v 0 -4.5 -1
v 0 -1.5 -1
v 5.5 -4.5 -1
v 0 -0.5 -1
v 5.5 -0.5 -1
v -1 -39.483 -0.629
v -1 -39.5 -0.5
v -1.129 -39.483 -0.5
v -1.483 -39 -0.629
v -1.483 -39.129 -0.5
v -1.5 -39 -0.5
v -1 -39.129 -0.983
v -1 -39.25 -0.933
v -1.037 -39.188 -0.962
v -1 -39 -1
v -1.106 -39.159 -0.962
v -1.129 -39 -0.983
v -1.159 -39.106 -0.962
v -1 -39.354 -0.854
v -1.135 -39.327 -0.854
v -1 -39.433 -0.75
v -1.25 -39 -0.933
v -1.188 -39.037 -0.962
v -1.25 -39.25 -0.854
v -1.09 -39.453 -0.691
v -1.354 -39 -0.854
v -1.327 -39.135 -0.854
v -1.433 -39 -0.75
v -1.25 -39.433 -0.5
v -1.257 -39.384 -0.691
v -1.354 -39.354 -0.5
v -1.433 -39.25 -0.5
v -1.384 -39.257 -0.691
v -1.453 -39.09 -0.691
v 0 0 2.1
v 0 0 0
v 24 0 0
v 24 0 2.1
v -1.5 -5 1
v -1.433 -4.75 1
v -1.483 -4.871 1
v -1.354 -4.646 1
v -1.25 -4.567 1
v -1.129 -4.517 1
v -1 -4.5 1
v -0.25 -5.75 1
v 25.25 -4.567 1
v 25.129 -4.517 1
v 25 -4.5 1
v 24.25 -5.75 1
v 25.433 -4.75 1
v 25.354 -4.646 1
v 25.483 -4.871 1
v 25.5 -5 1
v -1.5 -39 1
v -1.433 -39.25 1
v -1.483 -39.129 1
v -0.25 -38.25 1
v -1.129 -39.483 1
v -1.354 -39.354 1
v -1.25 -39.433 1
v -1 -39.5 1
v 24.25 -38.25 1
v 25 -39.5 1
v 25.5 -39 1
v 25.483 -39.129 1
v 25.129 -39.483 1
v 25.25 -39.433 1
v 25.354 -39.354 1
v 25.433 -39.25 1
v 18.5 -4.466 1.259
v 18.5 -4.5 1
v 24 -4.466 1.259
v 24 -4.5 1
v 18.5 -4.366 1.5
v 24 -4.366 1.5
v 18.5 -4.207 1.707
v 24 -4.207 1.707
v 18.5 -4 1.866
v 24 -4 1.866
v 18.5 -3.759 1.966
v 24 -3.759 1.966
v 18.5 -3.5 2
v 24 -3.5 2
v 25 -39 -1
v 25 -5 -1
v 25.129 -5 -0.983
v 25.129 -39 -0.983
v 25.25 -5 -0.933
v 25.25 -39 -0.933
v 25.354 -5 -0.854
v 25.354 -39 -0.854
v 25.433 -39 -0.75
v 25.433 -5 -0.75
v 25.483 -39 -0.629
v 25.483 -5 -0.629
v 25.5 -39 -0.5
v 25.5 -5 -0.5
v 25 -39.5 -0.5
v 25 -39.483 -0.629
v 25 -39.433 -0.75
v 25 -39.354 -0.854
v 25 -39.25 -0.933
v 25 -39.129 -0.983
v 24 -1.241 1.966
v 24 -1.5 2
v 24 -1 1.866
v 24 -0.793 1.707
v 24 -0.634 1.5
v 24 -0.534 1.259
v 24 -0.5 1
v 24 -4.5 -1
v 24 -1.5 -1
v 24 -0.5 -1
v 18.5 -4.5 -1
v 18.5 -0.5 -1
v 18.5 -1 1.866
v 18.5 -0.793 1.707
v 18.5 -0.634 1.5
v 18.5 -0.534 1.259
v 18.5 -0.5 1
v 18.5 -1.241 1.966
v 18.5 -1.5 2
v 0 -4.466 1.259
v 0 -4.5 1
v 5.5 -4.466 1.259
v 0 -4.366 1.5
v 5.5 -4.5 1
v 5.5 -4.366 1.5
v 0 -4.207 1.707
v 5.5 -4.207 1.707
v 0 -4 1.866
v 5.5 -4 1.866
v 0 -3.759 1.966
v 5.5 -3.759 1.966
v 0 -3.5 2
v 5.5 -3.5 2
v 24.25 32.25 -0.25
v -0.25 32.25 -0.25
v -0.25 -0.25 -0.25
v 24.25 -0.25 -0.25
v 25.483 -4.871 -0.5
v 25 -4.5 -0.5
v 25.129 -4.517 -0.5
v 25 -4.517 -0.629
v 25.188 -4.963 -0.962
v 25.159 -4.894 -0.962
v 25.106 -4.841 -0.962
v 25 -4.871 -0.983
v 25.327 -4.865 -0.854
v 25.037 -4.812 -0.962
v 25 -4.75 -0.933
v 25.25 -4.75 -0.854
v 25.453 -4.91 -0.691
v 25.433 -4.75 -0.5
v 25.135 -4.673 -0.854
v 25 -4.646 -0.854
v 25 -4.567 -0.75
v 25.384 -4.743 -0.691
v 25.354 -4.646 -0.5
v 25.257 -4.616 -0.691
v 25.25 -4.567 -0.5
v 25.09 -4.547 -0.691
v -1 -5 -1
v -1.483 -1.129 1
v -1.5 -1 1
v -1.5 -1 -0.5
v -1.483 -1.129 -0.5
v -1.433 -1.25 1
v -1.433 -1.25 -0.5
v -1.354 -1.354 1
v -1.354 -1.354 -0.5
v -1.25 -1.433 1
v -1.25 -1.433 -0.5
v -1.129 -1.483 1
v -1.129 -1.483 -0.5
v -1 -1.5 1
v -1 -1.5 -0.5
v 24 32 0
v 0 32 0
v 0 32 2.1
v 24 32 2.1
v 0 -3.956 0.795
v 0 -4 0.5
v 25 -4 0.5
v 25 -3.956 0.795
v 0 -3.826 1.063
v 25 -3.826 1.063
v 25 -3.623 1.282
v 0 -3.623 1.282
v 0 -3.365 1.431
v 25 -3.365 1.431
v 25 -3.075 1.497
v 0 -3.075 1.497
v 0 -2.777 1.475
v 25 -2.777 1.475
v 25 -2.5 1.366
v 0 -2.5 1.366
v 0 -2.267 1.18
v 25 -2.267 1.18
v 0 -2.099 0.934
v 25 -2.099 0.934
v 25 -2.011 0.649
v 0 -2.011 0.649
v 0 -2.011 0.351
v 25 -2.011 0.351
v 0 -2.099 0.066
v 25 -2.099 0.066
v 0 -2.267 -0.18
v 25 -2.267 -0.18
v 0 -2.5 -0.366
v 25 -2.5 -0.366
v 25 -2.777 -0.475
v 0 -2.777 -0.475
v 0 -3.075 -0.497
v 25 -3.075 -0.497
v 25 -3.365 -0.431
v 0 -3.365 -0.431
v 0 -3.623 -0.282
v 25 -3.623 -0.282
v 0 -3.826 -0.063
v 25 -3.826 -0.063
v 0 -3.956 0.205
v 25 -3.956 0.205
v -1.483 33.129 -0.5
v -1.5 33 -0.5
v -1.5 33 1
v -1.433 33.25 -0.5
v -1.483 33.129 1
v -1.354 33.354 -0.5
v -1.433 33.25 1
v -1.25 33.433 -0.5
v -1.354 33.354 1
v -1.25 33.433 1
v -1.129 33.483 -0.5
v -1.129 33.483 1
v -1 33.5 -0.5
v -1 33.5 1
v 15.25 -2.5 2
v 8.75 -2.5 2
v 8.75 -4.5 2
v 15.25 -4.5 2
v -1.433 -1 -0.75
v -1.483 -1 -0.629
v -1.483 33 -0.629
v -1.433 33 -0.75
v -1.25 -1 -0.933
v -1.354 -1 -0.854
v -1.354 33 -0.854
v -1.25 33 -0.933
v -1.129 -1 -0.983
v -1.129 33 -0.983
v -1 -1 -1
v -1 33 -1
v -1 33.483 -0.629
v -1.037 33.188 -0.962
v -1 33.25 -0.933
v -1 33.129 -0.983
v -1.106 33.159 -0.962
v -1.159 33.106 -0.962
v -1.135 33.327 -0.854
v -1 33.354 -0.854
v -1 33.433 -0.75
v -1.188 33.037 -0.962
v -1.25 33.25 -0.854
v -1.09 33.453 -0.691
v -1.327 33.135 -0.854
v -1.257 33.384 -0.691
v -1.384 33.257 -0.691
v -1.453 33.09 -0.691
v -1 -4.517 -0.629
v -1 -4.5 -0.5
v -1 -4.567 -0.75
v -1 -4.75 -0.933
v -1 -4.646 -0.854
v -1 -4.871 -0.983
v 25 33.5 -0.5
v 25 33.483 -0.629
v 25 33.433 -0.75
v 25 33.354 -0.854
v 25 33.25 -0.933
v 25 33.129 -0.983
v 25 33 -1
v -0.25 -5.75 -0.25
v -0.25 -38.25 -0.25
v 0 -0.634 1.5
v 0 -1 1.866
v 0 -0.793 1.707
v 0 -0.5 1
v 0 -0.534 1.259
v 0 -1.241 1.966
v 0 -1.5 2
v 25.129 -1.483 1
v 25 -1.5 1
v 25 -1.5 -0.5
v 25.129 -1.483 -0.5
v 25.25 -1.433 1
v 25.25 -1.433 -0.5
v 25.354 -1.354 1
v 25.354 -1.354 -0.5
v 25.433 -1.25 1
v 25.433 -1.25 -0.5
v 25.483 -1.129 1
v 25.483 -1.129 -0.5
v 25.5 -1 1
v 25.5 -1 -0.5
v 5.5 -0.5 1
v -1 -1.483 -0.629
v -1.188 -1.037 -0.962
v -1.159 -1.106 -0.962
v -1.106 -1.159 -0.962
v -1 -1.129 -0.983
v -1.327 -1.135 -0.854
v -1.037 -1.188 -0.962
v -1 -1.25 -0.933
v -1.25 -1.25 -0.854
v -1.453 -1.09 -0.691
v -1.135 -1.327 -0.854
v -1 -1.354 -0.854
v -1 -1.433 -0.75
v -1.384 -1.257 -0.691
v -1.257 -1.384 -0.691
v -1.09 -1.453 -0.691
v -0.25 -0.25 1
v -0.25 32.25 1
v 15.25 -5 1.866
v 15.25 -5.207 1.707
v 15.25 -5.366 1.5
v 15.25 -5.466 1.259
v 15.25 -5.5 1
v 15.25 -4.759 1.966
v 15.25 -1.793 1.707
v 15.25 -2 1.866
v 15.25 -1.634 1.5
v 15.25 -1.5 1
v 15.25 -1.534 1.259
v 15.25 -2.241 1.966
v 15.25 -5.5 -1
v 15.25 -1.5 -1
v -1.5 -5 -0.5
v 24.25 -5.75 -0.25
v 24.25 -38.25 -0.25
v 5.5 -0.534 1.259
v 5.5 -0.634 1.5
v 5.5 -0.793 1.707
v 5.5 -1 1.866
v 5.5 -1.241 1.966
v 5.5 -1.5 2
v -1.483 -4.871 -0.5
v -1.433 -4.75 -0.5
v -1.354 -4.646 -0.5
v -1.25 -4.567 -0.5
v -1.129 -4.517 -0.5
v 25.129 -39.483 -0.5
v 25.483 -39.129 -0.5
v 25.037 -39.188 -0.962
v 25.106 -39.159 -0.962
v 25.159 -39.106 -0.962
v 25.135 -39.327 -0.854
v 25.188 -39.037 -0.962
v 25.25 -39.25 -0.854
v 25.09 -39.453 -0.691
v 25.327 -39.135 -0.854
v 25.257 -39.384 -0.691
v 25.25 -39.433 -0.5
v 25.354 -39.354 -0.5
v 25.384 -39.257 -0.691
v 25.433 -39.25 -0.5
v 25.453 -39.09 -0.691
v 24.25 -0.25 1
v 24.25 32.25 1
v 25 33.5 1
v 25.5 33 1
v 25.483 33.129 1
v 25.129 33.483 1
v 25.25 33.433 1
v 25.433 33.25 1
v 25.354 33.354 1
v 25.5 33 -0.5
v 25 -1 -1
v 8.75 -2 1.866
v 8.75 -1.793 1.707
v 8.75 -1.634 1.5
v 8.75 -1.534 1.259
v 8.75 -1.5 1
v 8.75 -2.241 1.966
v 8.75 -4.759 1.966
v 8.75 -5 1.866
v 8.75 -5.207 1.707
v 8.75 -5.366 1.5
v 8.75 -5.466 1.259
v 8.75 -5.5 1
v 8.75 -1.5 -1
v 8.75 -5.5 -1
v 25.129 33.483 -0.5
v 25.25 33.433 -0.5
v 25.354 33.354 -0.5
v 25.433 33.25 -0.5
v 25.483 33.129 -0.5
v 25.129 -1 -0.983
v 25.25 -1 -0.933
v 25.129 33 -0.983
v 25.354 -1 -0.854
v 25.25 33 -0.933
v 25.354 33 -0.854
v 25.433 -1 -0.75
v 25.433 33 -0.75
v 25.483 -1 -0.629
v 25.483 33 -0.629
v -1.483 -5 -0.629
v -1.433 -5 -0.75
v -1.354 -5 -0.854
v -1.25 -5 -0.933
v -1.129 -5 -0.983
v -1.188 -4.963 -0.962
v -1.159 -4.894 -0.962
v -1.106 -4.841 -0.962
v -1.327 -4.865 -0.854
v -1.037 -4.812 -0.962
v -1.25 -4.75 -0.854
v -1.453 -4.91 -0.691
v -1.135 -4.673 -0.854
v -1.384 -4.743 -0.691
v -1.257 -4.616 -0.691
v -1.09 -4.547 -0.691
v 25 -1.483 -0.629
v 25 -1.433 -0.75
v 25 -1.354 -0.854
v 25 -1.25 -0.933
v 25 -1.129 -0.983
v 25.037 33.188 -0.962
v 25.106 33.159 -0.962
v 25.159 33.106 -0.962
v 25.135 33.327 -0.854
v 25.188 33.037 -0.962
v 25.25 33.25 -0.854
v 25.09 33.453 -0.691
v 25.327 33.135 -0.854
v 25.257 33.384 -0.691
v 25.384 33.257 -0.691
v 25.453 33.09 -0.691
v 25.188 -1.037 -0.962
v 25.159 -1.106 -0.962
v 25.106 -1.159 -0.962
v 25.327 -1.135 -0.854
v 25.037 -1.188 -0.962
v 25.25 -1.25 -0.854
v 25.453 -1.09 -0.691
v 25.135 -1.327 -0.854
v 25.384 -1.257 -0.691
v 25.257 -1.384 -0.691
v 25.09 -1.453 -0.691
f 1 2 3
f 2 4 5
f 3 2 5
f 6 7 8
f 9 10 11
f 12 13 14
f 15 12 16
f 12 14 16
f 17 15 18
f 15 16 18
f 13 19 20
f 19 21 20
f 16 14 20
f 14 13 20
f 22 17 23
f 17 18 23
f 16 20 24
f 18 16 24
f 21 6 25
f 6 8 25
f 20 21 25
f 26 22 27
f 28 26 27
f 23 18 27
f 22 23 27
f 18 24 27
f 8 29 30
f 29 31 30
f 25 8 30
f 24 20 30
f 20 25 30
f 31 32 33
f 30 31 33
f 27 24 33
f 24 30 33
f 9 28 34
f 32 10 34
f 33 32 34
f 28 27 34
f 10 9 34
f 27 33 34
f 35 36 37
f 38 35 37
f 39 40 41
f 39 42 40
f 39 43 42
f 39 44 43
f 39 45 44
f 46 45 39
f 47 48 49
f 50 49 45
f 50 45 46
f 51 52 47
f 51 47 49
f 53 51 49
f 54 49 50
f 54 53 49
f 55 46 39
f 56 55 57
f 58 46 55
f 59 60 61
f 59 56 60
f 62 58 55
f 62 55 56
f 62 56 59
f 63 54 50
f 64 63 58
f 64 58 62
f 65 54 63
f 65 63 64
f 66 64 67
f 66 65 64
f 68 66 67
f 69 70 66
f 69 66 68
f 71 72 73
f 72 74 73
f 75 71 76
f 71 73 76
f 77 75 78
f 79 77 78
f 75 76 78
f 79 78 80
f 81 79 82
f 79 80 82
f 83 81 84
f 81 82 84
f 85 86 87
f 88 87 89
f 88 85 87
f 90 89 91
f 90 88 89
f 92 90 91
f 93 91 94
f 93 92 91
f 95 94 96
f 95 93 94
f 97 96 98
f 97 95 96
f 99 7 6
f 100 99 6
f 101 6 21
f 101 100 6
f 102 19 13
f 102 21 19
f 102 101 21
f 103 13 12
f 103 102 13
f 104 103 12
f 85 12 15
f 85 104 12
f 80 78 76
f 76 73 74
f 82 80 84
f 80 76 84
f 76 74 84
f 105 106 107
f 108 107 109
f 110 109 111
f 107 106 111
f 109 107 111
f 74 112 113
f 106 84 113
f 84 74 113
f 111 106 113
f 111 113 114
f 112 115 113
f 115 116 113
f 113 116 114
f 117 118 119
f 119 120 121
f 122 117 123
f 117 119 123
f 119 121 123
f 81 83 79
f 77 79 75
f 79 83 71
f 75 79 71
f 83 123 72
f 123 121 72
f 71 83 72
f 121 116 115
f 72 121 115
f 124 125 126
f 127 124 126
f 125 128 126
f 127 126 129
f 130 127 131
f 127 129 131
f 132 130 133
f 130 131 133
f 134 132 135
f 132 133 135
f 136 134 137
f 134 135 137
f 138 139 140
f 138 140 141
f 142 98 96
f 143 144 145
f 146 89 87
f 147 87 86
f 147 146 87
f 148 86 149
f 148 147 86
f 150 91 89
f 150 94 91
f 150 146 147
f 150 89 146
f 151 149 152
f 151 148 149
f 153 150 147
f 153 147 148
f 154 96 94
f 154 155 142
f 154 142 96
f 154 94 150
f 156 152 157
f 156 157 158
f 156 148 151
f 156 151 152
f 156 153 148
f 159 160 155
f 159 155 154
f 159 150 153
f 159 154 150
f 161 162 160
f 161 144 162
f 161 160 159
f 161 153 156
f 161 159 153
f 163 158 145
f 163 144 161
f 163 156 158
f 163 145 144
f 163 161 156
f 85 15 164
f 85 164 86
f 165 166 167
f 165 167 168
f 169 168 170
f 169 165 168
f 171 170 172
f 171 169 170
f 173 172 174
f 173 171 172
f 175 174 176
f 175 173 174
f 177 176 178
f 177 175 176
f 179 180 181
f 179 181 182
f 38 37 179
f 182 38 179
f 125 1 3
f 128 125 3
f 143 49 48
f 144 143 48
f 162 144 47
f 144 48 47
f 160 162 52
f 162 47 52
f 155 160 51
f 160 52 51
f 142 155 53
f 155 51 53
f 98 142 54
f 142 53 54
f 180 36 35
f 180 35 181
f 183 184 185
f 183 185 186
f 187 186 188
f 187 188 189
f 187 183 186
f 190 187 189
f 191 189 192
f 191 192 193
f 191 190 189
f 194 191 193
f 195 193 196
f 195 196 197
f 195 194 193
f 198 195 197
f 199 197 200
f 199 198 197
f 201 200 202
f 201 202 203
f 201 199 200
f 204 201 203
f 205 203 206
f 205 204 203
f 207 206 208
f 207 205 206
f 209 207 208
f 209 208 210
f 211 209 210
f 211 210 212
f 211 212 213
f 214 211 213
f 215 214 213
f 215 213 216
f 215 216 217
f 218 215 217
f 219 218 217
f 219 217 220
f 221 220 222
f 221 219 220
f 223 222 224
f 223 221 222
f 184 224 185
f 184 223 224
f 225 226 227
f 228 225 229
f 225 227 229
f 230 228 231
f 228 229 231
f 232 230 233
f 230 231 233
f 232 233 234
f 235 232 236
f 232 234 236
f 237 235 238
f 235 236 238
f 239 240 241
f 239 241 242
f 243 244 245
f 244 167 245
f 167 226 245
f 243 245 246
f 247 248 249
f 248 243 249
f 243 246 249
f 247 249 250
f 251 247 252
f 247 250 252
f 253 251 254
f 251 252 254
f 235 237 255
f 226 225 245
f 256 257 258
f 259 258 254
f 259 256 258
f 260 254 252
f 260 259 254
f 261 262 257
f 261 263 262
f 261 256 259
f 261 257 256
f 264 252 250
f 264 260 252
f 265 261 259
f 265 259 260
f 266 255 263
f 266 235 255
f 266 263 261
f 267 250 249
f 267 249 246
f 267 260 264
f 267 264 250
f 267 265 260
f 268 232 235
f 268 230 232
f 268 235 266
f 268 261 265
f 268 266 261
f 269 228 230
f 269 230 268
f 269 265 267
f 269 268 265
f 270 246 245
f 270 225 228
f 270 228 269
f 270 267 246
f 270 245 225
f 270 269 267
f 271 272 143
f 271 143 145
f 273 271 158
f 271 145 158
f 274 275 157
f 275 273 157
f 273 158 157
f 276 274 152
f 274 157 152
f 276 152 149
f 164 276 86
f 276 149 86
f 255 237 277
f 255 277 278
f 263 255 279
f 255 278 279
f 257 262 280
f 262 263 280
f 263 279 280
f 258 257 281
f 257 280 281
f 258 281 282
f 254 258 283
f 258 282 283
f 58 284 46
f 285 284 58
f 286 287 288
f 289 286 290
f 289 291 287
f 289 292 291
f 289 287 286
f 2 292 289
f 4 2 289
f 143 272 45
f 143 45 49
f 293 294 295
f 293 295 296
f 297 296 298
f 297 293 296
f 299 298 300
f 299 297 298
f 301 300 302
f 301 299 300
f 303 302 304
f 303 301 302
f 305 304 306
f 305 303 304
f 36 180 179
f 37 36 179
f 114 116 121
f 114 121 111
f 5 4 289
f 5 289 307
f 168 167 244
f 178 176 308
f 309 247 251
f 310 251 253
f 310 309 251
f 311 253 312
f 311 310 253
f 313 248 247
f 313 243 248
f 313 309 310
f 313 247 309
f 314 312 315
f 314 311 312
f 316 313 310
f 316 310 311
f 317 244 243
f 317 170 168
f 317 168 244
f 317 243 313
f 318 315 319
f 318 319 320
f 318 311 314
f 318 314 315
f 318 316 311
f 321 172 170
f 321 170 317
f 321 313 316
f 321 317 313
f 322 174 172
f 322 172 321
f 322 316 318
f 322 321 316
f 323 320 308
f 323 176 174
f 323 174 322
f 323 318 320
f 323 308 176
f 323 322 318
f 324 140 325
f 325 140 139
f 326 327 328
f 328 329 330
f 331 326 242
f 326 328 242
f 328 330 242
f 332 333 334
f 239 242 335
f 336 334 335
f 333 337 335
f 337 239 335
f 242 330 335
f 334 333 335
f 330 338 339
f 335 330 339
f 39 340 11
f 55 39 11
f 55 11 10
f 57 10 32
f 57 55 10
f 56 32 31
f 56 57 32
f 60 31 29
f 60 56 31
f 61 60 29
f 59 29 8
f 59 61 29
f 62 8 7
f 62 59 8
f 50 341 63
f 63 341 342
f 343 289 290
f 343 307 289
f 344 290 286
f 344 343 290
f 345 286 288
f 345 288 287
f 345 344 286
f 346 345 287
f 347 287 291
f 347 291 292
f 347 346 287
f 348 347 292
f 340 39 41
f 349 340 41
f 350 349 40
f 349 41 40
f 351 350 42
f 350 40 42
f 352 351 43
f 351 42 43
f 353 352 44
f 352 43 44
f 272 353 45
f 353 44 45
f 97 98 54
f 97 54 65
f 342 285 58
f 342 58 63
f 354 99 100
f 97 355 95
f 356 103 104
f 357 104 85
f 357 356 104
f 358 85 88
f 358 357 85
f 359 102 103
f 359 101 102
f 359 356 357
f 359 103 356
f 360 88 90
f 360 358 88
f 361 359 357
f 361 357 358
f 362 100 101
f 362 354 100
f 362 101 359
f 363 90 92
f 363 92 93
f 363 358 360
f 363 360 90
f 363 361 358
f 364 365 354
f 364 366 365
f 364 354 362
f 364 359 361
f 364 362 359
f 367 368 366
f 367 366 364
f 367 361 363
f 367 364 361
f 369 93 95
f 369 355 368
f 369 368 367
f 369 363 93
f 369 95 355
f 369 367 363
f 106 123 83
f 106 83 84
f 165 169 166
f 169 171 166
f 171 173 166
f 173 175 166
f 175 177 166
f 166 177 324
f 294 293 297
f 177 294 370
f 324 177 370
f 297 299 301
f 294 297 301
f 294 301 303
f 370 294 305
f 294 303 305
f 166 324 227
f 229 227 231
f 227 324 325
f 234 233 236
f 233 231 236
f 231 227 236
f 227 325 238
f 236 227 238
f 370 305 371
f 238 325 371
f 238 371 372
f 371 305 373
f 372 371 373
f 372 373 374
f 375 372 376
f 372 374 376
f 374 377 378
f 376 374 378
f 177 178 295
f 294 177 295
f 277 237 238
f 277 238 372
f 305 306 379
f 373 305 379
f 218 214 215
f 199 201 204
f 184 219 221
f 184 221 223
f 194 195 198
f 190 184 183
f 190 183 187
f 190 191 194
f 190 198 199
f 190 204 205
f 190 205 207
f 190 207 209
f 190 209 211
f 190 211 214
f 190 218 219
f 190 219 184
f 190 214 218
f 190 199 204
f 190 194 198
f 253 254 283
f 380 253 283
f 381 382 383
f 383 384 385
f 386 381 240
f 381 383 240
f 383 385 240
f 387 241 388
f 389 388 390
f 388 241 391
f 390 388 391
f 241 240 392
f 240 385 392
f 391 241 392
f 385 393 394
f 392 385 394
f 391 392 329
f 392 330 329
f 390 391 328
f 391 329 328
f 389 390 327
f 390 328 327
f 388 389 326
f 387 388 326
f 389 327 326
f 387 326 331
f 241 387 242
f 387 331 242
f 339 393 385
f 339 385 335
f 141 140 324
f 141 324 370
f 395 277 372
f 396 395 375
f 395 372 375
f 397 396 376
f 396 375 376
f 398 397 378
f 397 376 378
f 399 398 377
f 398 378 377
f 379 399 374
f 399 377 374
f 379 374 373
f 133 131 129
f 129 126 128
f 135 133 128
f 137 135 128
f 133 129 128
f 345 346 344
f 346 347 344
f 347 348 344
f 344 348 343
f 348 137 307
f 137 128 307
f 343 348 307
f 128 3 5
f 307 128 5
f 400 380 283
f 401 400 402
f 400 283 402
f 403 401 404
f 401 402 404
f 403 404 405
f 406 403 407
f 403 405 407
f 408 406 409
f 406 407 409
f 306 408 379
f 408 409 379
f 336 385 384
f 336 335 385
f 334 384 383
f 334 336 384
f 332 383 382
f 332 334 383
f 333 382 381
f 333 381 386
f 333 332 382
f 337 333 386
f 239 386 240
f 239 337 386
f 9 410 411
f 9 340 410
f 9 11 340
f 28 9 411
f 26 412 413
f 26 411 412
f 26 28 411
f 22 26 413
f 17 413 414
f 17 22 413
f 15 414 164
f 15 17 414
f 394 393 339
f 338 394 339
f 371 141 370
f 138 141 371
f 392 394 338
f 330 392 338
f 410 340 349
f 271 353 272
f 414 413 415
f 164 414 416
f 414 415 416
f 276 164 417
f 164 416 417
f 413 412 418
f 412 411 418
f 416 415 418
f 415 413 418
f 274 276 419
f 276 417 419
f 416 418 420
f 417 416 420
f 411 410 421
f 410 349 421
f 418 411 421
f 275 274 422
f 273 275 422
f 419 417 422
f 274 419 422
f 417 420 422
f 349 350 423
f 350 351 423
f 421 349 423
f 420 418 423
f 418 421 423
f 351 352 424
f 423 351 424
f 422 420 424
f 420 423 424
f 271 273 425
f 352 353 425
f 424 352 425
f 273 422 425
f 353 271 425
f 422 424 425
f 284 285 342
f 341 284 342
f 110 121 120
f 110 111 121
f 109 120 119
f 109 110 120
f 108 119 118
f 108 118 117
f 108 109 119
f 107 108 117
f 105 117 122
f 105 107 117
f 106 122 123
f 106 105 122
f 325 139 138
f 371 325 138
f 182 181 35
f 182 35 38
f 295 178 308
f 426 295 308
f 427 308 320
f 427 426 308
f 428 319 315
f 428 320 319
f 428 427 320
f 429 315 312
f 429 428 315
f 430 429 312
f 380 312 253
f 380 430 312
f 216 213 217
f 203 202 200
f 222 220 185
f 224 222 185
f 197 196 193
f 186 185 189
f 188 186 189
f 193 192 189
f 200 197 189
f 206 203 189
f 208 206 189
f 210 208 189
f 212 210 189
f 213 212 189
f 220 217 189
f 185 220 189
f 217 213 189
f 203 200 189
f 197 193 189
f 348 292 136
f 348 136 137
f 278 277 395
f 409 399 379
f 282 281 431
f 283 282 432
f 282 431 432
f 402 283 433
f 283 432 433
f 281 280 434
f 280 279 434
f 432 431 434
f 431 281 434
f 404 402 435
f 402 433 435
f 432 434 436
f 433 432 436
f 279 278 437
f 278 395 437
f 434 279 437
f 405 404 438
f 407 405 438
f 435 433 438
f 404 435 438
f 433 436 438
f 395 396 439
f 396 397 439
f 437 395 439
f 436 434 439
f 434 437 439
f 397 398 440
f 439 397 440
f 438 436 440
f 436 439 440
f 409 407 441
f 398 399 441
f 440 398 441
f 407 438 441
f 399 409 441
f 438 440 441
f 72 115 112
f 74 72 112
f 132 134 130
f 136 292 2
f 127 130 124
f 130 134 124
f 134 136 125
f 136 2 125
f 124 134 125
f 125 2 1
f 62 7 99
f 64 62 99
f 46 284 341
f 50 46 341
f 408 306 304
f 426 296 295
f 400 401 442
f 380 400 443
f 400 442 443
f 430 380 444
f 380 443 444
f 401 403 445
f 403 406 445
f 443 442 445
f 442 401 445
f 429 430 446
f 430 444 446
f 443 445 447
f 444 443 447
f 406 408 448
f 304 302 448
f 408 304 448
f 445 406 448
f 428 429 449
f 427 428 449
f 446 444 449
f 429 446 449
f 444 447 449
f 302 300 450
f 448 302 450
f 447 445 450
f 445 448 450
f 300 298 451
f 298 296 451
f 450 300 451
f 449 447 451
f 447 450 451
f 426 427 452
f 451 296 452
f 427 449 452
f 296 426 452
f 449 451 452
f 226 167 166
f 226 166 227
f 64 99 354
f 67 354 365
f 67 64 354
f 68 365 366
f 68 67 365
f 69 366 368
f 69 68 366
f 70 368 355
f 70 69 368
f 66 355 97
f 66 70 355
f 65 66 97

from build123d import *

# Parameters (mm, degrees)
F0_W      = 24
F0_H      = 32
F1_DEPTH  = 2.1
F3_W      = 27.0000016689
F3_H      = 35.0000016689
F3_W_2    = 24
F3_H_2    = 32
F4_DEPTH  = 4
F6_OFFSET = 0.25
F7_R      = 0.5
F5_W      = 35.0000016689
F5_H      = 2
F8_DEPTH  = 27.0000016689
F11_W     = 6.5
F11_H     = 2.9999983311
F11_H_2   = 1
F12_DEPTH = 3
F11_W_2   = 5.5000003338
F11_W_3   = 5.5000004172
F13_R     = 1
F14_DEPTH = 25
F15_R     = 1
F15_2_R   = 1
F15_3_R   = 1


with BuildPart() as f1:
    # F0 (on Top) → F1 (new body)
    with BuildSketch(Plane.XY):
        with Locations((12, 16)):
            Rectangle(F0_W, F0_H)
    extrude(amount=F1_DEPTH)


with BuildPart() as f4:
    # F3 (on offset) → F4 (new body)
    with BuildSketch(Plane.XY.offset(-1)):
        with Locations((12, 16)):
            Rectangle(F3_W, F3_H)
        with Locations((12, 16)):
            Rectangle(F3_W_2, F3_H_2, mode=Mode.SUBTRACT)
        with Locations((12, 16)):
            Rectangle(F3_W_2, F3_H_2)
    extrude(amount=F4_DEPTH)

    # F6: cut F1, made larger all round first
    f6_tool = offset(f1.part, amount=F6_OFFSET, kind=Kind.INTERSECTION, mode=Mode.PRIVATE)
    add(f6_tool, mode=Mode.SUBTRACT)

    # F7
    f7_edges = [f4.edges().sort_by_distance(p)[0] for p in [
        (-1.500001, -1.500001, 1),
        (25.500001, -1.500001, 1),
        (25.500001, 33.500001, 1),
        (-1.500001, 33.500001, 1),
        (-1.500001, 16, 3),
        (12, 33.500001, 3),
        (12, 33.500001, -1),
        (-1.500001, 16, -1),
        (25.500001, 16, 3),
        (25.500001, 16, -1),
        (12, -1.500001, 3),
        (12, -1.500001, -1),
    ]]
    fillet(f7_edges, radius=F7_R)

    # F5 (on face) → F8 (cut, through all)
    with BuildSketch(Plane.YZ.offset(25.5000008345)):
        with Locations((16, 2)):
            Rectangle(F5_W, F5_H)
    extrude(amount=-F8_DEPTH, mode=Mode.SUBTRACT)


with BuildPart() as f10_1:
    # F10: instance of F4
    add(f4.part.mirror(Plane.XZ.offset(3)))


with BuildPart() as f12:
    # F11 (on offset) → F12 (new body)
    with BuildSketch(Plane.XY.offset(-1)):
        with Locations((11.9999995828, -3)):
            Rectangle(F11_W, F11_H)
        with Locations((11.9999995828, -4.9999991655)):
            Rectangle(F11_W, F11_H_2)
    extrude(amount=F12_DEPTH)

    # F15
    f15_edges = [f12.edges().sort_by_distance(p)[0] for p in [
        (12, -5.499999, 2),
        (12, -1.500001, 2),
    ]]
    fillet(f15_edges, radius=F15_R)


with BuildPart() as f12b:
    # F11 (on offset) → F12, piece 2 (new body)
    with BuildSketch(Plane.XY.offset(-1)):
        with Locations((21.2500005841, -3)):
            Rectangle(F11_W_2, F11_H)
        with Locations((21.2500006258, -1.0000008345)):
            Rectangle(F11_W_3, F11_H_2)
    extrude(amount=F12_DEPTH)

    # F15#2
    f15_2_edges = [f12b.edges().sort_by_distance(p)[0] for p in [
        (21.250001, -0.500001, 2),
        (21.25, -4.499999, 2),
    ]]
    fillet(f15_2_edges, radius=F15_2_R)


with BuildPart() as f12c:
    # F11 (on offset) → F12, piece 3 (new body)
    with BuildSketch(Plane.XY.offset(-1)):
        with Locations((2.7499993742, -1.0000008345)):
            Rectangle(F11_W_3, F11_H_2)
        Polygon((5.4999995828, -1.5000008345), (-6.676e-07, -1.5000008345), (0, -4.4999991655), (5.4999995828, -4.4999991655), align=None)
    extrude(amount=F12_DEPTH)

    # F15#3
    f15_3_edges = [f12c.edges().sort_by_distance(p)[0] for p in [
        (2.749999, -0.500001, 2),
        (2.75, -4.499999, 2),
    ]]
    fillet(f15_3_edges, radius=F15_3_R)


with BuildPart() as f14:
    # F13 (on face) → F14 (new body)
    with BuildSketch(Plane(origin=(-9.179e-07, 0, 0), x_dir=(1.669e-07, -1, 0), z_dir=(-1, -1.669e-07, 0))):
        with Locations((3, 0.5)):
            Circle(F13_R)
    extrude(amount=-F14_DEPTH)


solid = Compound([f1.part, f4.part, f10_1.part, f12.part, f12b.part, f12c.part, f14.part])
